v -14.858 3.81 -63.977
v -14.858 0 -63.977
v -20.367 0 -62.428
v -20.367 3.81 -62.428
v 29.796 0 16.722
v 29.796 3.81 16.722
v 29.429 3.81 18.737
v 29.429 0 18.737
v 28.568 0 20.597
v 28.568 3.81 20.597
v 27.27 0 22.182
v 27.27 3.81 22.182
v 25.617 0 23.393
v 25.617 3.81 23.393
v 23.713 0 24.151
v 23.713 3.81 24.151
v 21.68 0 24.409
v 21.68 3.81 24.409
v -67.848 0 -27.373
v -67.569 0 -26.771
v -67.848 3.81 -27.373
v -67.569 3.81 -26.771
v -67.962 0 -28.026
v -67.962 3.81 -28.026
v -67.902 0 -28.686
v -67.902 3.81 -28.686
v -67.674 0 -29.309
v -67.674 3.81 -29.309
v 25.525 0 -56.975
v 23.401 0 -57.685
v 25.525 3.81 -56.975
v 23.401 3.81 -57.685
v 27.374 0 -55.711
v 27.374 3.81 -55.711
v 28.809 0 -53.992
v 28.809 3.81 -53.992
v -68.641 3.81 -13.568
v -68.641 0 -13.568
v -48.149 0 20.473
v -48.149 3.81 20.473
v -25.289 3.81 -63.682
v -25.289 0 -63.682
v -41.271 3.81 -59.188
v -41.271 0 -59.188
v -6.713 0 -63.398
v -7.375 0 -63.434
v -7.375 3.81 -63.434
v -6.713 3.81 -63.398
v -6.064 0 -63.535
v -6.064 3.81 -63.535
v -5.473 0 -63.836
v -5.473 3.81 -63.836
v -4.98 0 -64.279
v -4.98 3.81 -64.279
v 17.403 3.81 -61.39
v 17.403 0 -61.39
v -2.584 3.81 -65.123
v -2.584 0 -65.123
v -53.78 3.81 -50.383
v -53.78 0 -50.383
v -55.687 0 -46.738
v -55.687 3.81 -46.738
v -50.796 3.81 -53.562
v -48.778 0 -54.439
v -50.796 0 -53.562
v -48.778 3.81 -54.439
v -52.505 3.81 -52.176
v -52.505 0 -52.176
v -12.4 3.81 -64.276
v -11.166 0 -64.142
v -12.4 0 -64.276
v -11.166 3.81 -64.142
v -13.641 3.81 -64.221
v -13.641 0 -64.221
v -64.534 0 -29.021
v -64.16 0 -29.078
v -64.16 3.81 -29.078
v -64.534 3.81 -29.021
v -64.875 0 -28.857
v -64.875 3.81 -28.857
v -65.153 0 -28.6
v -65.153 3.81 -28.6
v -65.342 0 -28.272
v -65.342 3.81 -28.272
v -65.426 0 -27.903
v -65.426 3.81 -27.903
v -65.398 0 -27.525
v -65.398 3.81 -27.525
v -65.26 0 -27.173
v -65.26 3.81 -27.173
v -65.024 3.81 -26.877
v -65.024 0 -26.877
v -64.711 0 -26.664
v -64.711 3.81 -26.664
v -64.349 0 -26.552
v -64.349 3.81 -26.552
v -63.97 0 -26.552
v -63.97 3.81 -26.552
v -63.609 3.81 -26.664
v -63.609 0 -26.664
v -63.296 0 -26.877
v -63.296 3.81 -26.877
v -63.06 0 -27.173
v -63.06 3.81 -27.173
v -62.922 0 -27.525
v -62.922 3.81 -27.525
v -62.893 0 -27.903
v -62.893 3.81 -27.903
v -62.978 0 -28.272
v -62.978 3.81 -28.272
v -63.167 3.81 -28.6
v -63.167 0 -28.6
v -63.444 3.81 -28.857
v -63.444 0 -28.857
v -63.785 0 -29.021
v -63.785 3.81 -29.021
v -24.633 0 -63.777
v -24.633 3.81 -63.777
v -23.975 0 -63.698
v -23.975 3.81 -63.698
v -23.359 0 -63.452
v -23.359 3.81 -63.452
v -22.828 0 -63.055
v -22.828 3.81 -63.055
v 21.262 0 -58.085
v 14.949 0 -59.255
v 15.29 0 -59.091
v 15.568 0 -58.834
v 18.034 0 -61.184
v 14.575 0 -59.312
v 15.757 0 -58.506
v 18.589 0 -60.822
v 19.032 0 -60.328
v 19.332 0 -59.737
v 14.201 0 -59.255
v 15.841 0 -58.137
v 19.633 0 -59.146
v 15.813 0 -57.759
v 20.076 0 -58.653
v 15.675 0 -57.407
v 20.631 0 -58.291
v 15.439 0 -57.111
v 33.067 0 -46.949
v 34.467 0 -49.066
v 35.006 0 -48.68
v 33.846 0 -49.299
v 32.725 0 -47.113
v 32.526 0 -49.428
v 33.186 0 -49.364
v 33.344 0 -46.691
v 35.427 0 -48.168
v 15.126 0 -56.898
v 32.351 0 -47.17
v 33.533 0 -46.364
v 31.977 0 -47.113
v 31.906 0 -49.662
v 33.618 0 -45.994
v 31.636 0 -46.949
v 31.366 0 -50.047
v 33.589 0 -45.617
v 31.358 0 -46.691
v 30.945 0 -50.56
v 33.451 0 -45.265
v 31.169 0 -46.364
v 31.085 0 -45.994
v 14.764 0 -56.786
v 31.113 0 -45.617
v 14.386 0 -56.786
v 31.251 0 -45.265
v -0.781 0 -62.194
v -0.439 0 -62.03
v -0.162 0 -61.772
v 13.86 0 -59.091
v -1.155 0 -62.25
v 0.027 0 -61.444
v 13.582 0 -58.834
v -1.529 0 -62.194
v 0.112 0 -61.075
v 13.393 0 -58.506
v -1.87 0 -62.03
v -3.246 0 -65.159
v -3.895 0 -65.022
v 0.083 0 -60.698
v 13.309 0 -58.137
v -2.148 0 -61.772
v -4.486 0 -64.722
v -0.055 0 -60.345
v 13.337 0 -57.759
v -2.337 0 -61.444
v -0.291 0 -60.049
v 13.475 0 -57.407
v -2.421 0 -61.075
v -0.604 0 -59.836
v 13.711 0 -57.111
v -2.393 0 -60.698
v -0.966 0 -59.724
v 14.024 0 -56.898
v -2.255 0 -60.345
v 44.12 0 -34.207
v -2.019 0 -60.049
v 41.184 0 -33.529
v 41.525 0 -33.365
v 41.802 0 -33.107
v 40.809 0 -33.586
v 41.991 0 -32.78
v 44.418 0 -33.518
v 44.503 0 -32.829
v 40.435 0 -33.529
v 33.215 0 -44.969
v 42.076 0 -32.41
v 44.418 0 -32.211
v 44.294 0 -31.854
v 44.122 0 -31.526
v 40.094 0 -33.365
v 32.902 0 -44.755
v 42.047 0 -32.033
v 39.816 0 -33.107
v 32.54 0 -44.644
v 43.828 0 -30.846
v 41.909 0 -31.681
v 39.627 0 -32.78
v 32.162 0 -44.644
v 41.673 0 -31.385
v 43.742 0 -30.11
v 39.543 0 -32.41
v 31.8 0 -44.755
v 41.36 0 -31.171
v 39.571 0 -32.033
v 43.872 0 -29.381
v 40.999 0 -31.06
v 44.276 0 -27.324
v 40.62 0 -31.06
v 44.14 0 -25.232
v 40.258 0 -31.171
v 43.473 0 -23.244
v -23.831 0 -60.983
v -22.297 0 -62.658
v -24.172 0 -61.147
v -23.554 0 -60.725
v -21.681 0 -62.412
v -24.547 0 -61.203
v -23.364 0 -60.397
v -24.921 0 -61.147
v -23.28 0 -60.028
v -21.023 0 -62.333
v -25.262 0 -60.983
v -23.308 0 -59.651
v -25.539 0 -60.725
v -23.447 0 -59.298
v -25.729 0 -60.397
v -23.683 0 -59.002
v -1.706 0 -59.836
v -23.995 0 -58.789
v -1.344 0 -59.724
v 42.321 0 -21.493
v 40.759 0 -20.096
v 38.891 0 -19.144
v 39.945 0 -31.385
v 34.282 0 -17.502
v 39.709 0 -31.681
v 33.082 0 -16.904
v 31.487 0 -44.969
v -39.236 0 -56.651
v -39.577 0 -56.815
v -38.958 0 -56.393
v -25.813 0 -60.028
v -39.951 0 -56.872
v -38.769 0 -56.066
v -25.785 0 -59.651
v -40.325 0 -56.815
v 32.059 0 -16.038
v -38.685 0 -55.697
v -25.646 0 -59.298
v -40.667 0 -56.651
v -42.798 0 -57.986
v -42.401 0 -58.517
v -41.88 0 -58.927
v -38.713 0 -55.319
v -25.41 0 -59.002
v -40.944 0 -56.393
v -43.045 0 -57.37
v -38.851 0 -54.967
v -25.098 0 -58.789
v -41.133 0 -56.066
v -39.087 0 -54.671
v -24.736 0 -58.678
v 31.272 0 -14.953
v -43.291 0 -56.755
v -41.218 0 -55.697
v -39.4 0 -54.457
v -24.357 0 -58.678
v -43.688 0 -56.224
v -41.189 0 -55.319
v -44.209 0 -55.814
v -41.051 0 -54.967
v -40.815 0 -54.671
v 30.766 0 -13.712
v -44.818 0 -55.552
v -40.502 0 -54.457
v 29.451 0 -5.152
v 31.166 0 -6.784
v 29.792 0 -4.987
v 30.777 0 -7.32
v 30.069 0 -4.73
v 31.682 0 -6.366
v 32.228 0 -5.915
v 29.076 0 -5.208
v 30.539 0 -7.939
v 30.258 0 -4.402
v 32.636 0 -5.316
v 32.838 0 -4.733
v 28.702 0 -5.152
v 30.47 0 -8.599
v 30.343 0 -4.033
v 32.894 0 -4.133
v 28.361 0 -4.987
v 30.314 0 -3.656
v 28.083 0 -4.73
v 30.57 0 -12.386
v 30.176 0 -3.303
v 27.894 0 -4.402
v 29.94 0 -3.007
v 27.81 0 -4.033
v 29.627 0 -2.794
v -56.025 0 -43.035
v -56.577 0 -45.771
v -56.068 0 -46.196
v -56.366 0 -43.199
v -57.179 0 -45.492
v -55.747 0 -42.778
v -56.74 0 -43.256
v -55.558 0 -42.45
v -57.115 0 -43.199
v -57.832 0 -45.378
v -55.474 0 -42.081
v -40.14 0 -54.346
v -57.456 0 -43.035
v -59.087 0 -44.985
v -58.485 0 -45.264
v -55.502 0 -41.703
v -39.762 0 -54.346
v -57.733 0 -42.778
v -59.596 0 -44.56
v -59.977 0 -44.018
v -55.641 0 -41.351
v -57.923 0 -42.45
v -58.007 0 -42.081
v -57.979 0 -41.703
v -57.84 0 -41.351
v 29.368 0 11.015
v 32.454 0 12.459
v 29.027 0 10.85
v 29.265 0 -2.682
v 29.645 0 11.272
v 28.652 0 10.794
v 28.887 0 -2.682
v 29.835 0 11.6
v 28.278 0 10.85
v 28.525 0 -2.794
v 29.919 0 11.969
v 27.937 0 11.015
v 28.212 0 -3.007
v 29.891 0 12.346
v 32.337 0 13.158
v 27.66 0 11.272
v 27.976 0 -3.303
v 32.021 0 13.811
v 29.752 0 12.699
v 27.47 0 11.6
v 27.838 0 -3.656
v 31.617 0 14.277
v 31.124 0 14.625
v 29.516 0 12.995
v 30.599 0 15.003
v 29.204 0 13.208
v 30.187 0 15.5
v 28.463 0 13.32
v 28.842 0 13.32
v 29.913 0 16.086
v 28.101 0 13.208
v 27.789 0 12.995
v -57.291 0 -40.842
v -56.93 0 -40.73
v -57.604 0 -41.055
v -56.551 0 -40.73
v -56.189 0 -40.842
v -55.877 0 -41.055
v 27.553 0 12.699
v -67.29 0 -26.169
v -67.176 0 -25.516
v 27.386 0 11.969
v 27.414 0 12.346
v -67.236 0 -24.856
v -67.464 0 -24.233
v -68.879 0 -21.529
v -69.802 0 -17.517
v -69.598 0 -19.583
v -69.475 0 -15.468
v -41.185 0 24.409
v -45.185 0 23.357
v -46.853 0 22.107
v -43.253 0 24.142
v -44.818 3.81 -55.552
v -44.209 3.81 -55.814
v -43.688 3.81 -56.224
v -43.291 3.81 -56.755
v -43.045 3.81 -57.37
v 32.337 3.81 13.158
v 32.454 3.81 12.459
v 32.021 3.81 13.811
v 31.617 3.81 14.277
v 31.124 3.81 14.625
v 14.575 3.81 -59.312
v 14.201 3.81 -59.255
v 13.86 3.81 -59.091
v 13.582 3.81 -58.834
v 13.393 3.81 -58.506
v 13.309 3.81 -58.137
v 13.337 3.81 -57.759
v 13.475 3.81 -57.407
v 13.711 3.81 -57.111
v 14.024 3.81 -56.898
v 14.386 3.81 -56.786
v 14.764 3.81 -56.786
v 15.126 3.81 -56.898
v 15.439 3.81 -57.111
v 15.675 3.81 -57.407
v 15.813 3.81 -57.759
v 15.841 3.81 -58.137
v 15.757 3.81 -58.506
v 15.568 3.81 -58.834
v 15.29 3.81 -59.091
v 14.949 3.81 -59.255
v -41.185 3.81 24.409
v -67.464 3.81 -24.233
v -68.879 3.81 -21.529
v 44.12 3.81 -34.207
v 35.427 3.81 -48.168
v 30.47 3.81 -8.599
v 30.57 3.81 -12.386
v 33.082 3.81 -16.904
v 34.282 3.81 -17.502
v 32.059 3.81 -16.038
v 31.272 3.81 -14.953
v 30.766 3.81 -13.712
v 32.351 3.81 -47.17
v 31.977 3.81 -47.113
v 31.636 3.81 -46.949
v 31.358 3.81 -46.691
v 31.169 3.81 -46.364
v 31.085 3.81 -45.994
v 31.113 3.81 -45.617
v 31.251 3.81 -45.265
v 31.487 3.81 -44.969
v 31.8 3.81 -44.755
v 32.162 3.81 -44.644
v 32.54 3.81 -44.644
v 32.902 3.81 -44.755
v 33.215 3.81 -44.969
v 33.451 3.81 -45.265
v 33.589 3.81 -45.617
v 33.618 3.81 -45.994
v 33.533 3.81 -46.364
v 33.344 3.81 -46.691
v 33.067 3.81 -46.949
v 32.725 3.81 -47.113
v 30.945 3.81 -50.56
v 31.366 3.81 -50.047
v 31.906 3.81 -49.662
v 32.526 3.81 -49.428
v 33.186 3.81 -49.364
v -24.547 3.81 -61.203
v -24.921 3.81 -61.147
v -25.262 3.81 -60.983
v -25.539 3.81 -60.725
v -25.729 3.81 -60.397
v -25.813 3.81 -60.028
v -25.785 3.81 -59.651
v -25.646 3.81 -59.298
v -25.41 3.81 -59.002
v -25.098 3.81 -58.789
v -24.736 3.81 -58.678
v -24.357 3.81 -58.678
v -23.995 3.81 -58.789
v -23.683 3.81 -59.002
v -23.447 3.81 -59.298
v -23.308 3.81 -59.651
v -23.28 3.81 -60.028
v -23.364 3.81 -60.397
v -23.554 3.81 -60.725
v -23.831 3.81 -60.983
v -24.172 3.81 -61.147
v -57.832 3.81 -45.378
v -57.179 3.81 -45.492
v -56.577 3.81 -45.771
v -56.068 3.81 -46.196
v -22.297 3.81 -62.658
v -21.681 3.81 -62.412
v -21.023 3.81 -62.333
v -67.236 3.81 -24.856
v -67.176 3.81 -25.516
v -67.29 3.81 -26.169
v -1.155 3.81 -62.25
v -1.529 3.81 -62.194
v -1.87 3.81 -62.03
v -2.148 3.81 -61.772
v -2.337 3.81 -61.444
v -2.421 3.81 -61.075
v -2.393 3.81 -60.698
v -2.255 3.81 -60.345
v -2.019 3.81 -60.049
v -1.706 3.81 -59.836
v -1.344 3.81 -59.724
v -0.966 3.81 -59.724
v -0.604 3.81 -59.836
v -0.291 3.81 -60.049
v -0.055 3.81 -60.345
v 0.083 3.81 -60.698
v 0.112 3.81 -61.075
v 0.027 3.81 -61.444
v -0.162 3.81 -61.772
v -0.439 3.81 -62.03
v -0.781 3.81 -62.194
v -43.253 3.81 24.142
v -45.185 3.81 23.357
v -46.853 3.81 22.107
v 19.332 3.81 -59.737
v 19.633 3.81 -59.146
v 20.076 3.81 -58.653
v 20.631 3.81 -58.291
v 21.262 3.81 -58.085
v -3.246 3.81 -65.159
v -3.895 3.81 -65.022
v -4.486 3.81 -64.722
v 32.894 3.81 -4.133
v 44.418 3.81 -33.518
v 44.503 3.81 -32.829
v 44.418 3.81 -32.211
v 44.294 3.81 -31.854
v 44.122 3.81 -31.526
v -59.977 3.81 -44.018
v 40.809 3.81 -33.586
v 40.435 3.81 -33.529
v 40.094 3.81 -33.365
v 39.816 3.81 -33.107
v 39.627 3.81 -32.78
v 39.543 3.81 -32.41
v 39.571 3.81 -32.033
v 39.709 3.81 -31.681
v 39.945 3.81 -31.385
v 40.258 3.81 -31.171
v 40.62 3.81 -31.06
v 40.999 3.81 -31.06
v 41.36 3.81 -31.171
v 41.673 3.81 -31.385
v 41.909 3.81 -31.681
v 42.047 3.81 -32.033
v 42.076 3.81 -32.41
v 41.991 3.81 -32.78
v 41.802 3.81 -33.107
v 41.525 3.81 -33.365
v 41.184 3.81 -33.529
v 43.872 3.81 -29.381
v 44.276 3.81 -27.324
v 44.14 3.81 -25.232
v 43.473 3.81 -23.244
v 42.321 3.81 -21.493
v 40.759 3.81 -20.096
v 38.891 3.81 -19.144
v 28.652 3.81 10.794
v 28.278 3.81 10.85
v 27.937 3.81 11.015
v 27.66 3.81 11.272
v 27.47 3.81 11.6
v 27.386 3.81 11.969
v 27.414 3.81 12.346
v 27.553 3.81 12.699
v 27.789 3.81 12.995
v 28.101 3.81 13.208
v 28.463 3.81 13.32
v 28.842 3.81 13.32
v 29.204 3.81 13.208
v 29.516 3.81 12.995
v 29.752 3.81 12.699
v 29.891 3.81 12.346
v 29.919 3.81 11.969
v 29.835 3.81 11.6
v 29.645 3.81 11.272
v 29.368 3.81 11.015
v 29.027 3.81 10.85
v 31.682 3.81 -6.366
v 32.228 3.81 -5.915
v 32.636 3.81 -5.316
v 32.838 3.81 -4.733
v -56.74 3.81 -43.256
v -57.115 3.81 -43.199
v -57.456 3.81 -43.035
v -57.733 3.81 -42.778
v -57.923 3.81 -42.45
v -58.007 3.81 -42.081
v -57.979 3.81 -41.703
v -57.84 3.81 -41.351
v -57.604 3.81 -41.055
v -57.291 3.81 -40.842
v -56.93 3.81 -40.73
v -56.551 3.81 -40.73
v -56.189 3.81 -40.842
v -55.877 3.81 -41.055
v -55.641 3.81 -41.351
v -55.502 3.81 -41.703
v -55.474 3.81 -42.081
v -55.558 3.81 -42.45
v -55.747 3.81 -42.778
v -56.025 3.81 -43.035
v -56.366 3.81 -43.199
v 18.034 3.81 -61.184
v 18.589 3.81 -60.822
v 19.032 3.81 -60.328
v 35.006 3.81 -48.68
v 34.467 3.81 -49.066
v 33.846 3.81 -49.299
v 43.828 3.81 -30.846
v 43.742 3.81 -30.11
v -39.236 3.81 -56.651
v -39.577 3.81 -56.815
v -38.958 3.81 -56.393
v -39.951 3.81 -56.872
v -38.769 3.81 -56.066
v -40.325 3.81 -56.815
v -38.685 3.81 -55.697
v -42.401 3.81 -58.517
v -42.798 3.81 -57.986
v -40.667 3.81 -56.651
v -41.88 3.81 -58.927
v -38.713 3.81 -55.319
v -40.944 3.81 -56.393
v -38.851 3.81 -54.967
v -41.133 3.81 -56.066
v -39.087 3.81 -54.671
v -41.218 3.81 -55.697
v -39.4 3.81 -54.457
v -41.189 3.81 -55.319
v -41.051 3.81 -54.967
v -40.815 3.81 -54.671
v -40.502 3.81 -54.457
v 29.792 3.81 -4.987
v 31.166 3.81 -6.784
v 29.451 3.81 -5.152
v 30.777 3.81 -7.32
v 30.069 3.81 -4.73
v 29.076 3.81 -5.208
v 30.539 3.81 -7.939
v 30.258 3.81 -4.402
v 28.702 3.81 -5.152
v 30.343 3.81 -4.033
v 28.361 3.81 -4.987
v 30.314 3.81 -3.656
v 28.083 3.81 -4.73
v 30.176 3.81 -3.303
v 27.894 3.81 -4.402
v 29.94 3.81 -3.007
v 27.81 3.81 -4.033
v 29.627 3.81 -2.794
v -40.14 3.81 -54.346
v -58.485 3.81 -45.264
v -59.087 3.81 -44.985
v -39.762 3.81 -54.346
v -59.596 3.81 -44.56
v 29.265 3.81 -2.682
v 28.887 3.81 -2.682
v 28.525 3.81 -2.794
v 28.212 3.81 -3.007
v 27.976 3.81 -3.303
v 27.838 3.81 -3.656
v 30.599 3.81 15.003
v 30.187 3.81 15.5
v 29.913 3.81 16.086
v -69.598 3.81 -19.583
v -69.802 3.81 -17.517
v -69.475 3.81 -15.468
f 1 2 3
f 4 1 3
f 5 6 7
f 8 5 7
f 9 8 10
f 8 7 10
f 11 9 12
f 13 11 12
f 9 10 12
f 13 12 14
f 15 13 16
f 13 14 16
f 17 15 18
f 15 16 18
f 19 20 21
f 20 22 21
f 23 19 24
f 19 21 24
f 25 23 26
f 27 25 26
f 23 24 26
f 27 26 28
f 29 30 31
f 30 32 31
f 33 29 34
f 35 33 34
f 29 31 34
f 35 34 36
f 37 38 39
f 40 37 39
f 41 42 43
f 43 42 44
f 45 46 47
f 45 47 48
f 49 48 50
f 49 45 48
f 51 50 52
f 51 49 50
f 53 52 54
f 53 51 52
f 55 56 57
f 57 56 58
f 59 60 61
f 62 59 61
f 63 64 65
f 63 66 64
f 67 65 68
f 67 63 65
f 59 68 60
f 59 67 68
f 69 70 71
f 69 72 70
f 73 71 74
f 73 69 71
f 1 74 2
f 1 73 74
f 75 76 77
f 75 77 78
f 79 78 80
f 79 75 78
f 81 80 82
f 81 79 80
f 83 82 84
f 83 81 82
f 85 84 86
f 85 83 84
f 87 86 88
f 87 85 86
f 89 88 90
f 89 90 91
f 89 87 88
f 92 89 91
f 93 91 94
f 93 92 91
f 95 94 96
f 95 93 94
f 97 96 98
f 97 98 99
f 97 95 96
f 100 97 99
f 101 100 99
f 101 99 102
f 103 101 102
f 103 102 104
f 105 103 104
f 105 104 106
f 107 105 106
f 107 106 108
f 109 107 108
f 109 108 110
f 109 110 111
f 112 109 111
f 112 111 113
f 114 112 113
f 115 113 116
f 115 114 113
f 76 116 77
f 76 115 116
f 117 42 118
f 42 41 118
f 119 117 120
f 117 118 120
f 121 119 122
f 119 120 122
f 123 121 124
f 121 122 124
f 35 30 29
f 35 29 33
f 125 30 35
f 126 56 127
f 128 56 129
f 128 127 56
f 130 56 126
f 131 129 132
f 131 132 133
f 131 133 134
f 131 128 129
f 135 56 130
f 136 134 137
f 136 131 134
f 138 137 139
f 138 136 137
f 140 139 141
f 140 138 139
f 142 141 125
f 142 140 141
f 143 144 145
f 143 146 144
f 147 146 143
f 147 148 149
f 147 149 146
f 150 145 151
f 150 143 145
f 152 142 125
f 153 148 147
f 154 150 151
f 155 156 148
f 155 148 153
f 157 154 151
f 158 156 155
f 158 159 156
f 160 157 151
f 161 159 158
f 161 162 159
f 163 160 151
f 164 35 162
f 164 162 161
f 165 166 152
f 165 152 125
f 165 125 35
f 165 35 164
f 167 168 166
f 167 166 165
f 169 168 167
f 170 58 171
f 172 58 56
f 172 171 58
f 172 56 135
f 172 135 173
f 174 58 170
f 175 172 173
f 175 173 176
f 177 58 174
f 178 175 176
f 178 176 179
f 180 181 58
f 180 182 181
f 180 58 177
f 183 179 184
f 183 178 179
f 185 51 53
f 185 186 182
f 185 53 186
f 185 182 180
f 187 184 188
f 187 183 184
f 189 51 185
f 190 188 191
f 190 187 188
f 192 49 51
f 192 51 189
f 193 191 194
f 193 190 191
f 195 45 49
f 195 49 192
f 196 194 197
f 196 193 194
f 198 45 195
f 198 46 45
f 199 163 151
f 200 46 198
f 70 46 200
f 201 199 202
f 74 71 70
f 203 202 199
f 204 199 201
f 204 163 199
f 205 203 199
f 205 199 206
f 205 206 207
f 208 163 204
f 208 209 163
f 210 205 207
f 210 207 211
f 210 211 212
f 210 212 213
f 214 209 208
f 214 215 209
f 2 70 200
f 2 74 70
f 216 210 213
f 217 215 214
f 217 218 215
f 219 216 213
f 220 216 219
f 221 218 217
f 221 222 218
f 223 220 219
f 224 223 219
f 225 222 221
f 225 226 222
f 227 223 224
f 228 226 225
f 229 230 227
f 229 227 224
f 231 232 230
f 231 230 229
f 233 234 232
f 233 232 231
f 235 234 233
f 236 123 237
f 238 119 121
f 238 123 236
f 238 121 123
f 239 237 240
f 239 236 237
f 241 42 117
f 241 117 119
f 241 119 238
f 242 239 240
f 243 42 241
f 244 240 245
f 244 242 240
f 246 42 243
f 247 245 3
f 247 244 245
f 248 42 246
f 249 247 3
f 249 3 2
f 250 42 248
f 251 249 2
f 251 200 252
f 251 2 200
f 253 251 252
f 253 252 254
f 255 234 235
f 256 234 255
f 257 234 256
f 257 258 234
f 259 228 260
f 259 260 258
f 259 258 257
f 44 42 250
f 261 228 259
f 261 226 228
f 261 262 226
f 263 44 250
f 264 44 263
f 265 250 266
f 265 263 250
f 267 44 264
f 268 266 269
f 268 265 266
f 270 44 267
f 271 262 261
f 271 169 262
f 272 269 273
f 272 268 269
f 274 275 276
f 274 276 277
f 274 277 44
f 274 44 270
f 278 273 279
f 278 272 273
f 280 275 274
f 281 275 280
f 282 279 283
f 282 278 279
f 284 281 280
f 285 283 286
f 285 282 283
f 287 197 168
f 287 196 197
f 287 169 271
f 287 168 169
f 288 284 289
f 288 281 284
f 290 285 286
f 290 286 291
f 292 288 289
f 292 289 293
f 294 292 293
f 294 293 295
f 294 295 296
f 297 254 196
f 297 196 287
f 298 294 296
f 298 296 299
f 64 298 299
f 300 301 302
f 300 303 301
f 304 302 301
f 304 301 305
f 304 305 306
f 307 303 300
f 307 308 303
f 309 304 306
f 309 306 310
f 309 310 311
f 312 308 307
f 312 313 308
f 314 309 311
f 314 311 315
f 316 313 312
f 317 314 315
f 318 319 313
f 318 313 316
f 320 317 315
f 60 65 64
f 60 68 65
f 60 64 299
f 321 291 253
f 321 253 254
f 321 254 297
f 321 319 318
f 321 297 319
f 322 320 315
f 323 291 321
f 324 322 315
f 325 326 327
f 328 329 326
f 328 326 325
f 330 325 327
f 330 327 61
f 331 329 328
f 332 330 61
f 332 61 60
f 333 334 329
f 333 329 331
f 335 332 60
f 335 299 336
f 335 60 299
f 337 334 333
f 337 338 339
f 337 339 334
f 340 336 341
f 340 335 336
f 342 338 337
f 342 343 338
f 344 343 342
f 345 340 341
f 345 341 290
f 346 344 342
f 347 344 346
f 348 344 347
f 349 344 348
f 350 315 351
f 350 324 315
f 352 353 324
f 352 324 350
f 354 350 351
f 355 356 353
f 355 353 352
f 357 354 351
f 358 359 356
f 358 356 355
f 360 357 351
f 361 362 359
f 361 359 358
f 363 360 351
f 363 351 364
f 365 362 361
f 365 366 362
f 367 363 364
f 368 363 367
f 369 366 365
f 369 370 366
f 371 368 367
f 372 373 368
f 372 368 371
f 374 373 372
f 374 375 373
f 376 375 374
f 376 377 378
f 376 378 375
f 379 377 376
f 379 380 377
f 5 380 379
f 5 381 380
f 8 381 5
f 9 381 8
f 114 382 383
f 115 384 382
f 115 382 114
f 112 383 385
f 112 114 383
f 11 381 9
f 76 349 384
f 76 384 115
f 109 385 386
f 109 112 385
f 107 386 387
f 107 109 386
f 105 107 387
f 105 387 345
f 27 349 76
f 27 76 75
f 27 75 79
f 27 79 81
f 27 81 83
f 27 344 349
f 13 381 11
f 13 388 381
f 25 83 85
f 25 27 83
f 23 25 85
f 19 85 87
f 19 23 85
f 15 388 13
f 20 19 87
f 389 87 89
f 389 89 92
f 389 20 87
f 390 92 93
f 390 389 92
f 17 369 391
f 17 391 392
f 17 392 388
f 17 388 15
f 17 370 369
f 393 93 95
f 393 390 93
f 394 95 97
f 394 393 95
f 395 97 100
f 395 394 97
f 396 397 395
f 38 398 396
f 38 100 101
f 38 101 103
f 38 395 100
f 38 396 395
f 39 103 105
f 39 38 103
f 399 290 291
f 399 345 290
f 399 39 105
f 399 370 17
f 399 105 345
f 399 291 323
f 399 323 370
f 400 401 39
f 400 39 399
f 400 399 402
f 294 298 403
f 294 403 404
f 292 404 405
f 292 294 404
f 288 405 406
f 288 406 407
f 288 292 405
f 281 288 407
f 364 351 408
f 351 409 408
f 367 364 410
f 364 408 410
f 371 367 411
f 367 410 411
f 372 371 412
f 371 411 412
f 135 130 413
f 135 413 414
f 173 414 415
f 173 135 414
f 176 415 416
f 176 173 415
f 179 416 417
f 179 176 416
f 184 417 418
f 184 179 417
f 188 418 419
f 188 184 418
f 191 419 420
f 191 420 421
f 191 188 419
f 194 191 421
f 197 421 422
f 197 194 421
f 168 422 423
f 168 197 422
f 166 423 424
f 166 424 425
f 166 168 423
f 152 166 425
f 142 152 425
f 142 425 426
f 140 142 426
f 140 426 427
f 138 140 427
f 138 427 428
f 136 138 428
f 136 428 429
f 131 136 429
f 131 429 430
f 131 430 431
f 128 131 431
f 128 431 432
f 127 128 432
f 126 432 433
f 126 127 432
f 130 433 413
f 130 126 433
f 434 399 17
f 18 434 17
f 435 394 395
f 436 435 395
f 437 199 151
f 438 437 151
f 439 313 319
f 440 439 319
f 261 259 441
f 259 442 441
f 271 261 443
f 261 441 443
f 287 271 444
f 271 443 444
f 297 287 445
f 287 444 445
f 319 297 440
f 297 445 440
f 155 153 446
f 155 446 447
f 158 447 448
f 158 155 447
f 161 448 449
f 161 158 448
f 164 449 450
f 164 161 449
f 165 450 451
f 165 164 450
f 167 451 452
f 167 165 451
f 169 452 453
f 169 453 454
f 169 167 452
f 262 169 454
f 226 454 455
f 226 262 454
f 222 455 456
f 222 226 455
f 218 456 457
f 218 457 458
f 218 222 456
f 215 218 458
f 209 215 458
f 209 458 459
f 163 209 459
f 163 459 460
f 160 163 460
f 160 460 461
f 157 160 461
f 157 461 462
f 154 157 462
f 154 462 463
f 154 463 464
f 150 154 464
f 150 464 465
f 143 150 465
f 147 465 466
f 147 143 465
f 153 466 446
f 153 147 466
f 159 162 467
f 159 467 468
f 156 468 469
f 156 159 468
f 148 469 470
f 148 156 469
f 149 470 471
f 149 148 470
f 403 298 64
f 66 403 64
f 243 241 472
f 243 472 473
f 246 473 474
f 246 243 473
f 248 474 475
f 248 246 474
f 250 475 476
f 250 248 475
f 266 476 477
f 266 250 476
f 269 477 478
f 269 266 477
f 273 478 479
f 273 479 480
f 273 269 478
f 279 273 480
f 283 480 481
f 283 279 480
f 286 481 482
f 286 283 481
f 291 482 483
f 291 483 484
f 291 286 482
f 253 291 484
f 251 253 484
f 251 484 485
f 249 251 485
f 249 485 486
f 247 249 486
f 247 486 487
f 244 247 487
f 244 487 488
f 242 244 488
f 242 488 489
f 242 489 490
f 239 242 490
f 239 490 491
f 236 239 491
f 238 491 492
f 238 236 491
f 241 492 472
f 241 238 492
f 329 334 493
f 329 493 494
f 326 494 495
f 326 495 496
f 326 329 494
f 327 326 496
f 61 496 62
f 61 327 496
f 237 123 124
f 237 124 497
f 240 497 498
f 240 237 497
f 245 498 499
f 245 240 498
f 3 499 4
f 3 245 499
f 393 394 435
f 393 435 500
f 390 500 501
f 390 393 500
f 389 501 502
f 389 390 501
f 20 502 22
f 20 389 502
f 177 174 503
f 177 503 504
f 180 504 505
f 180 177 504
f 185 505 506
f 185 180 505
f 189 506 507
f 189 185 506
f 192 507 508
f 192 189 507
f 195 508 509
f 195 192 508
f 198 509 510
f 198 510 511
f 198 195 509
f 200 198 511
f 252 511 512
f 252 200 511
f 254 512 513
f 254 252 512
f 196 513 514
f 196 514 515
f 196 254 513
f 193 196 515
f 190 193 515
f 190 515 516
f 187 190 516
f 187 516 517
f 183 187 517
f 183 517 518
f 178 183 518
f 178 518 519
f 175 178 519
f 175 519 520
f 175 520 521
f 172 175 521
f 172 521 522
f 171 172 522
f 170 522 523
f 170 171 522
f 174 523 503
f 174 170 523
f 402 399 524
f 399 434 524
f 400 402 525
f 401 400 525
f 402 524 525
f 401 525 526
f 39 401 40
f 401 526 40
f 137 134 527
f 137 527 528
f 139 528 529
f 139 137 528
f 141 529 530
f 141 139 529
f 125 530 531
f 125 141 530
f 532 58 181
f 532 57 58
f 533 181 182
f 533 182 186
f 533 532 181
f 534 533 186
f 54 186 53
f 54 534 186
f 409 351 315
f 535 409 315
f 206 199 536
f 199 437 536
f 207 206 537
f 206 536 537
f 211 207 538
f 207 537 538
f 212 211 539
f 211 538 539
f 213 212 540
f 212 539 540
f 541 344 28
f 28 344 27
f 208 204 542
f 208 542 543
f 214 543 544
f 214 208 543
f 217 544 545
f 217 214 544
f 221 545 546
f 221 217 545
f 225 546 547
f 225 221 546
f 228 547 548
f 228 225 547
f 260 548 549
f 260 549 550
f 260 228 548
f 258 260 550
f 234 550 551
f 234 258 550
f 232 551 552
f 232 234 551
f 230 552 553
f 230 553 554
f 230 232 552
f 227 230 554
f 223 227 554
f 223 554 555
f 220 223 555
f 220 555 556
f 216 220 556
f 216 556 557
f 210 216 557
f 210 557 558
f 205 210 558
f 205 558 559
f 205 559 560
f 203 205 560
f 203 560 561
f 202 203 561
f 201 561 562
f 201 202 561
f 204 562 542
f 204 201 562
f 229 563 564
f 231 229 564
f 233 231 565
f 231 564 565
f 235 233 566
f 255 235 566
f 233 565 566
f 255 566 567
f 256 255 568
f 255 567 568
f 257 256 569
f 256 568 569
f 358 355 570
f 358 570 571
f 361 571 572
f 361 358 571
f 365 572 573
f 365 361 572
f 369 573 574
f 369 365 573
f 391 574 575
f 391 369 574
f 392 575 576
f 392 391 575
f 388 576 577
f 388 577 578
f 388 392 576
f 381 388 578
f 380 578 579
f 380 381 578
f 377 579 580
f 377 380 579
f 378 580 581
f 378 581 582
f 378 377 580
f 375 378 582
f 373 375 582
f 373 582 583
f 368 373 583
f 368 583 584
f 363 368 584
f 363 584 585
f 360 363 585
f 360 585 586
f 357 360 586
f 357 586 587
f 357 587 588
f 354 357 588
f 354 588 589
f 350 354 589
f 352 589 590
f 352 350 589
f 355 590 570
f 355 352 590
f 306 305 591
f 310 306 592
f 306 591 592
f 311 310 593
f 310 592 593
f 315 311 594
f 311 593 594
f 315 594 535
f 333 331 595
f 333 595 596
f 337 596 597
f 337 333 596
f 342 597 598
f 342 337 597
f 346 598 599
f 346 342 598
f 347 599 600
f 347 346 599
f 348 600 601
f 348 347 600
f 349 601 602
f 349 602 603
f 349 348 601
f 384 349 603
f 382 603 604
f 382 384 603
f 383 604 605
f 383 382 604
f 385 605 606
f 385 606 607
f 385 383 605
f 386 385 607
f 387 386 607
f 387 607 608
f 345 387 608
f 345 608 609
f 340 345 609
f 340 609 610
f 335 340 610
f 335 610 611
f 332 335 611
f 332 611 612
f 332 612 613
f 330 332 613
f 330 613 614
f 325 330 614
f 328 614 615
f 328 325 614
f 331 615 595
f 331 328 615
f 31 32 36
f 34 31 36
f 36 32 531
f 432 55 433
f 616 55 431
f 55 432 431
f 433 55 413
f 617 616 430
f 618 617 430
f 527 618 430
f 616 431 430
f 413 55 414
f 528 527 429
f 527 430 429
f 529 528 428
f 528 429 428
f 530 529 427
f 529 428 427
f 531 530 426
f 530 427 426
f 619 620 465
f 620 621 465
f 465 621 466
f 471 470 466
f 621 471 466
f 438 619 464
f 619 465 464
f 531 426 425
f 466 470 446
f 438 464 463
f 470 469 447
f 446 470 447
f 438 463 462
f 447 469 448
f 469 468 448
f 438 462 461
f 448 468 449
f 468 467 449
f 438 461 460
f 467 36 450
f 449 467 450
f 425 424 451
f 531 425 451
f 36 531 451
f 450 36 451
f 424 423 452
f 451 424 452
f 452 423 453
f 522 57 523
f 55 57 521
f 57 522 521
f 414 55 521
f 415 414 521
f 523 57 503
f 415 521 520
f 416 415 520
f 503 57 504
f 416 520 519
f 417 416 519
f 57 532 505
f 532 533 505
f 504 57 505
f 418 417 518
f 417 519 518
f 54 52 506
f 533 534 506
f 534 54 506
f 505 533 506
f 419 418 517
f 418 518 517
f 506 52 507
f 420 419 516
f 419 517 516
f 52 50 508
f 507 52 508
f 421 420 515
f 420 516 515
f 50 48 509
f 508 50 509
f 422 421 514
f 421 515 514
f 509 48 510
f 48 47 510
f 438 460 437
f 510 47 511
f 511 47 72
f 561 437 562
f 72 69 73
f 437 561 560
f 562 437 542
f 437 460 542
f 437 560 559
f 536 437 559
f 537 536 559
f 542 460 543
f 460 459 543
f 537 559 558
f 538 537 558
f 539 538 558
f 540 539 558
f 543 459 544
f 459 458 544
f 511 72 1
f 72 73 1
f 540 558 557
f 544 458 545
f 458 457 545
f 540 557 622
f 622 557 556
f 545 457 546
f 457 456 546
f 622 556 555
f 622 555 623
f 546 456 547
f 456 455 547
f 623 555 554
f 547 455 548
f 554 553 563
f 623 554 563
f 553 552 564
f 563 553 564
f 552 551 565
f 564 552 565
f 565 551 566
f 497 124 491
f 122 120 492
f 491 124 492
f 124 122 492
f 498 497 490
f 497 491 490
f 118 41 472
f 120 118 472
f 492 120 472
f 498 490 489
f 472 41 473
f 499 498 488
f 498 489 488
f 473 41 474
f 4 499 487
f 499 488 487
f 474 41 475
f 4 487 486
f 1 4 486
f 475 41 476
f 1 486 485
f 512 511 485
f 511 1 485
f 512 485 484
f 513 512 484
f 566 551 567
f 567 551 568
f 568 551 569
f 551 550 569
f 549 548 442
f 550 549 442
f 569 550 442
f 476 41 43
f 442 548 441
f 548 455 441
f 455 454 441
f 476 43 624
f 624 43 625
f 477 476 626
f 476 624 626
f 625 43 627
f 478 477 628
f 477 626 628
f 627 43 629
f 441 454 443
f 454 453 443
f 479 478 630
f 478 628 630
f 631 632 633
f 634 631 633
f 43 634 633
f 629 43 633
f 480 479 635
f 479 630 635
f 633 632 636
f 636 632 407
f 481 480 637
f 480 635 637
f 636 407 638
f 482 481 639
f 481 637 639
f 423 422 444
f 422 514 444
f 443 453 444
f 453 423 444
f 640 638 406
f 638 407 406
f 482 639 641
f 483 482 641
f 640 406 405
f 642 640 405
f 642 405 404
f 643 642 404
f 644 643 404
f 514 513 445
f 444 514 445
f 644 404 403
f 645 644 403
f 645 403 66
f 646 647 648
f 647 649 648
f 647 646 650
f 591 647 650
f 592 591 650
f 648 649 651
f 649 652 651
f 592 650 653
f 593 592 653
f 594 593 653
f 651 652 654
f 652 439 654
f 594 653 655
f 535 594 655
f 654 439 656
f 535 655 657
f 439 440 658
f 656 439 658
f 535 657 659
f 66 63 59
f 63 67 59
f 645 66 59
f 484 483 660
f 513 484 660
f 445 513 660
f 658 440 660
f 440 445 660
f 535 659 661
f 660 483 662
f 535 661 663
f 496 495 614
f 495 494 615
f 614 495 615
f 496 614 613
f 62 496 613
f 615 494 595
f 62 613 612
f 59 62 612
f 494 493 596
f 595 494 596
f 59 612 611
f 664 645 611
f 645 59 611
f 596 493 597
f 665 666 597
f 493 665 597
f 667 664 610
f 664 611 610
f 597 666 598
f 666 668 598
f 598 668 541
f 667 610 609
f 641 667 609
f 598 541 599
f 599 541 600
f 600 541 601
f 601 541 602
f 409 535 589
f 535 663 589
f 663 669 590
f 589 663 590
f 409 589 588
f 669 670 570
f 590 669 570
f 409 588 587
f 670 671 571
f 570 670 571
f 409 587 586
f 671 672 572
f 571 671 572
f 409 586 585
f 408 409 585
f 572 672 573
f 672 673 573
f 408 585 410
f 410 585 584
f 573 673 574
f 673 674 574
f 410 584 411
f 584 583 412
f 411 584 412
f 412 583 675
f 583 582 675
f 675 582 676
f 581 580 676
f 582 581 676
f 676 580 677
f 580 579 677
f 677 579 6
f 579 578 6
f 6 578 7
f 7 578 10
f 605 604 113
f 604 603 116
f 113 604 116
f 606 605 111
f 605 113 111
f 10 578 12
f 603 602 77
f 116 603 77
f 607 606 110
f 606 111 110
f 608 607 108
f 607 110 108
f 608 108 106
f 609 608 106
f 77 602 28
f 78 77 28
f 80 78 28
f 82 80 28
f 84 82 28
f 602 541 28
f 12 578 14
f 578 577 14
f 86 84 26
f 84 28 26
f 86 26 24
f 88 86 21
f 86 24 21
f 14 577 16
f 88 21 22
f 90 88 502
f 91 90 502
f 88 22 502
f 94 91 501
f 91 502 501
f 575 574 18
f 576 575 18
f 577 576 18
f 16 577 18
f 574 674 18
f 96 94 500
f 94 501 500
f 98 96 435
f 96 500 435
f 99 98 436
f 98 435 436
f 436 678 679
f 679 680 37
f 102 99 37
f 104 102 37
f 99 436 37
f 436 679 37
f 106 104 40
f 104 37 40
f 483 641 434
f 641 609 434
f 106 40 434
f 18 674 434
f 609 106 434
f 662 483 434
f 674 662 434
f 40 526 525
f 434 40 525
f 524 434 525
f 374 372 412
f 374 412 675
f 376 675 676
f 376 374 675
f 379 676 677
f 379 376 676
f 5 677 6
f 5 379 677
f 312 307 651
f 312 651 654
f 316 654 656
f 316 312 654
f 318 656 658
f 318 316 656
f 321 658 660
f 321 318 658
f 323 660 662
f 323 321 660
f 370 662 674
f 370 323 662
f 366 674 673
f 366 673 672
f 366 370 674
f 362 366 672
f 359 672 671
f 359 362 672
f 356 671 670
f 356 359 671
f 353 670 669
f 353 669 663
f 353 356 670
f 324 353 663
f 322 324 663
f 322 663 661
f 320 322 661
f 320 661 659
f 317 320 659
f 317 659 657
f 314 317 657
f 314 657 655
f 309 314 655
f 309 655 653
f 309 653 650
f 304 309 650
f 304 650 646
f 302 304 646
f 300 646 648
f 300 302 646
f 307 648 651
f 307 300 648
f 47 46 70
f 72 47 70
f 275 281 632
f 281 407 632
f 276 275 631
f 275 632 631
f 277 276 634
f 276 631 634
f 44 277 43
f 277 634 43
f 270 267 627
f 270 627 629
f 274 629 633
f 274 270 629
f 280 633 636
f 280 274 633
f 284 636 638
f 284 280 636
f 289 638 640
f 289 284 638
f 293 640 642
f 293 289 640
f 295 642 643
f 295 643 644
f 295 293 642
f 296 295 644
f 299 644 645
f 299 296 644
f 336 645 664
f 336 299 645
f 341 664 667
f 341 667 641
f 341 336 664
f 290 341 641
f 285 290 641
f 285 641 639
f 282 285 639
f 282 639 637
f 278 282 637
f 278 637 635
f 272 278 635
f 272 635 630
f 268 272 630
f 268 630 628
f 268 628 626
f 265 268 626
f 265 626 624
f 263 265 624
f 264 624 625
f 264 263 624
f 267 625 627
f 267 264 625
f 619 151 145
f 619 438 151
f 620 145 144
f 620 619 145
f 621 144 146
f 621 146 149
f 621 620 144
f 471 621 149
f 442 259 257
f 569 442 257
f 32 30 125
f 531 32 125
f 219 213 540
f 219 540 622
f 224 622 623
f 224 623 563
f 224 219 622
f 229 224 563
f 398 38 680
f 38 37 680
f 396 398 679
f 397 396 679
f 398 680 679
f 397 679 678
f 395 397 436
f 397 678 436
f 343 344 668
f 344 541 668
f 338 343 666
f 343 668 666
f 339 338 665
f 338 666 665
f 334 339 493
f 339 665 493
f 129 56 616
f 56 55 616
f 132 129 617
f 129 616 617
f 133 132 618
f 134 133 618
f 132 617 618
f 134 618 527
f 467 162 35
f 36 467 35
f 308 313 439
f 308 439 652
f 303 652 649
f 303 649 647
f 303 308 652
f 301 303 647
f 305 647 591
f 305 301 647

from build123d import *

# Parameters (mm, degrees)
SKETCH1_R           = 1.27
BOSS_EXTRUDE1_DEPTH = 3.81
FILLET1_R           = 8.128
FILLET2_R           = 5.588
FILLET3_R           = 2.54
FILLET4_R           = 2.54


with BuildPart() as part:
    # Sketch1 → Boss-Extrude1 (new body)
    with BuildSketch(Plane(origin=(0, 0, 0), x_dir=(1, 0, 0), z_dir=(0, 1, 0))):
        Polygon((26.917778839, 57.028322157), (18.764761653, 58.551267753), (19.231154767, 61.048081215), (-4.411826254, 65.464479834), (-4.878219367, 62.967666372), (-13.031236553, 64.490611968), (-22.811913306, 61.740346117), (-23.499479769, 64.185515305), (-43.060833275, 58.684983602), (-42.373266812, 56.239814414), (-52.153943565, 53.489548563), (-56.864625449, 44.487600096), (-59.115112565, 45.665270567), (-68.536476333, 27.661373635), (-66.285989216, 26.483703164), (-70.9966711, 17.481754697), (-45.779512683, -24.409388032), (29.596058622, -24.409388032), (29.864982666, -14.252947718), (32.404982666, -14.320202292), (32.942830753, 5.992678337), (30.402830753, 6.059932911), (30.671754796, 16.216373225), (48.398722953, 22.529356376), (43.028486925, 31.154097821), (45.184672286, 32.496656828), (34.444200229, 49.746139719), (32.288014868, 48.403580712), align=None)
        with Locations(Location((28.652499761, -12.063891898, 0), (0, 0, 90))):
            Circle(SKETCH1_R, mode=Mode.SUBTRACT)
        with Locations(Location((29.076203579, 3.938108102, 0), (0, 0, 90))):
            Circle(SKETCH1_R, mode=Mode.SUBTRACT)
        with Locations(Location((-64.159725757, 27.807781977, 0), (0, 0, 90))):
            Circle(SKETCH1_R, mode=Mode.SUBTRACT)
        with Locations(Location((-56.740401791, 41.985850812, 0), (0, 0, 90))):
            Circle(SKETCH1_R, mode=Mode.SUBTRACT)
        with Locations(Location((-39.951089771, 55.601661313, 0), (0, 0, 90))):
            Circle(SKETCH1_R, mode=Mode.SUBTRACT)
        with Locations(Location((-24.546523885, 59.933330029, 0), (0, 0, 90))):
            Circle(SKETCH1_R, mode=Mode.SUBTRACT)
        with Locations(Location((40.809219088, 32.315575875, 0), (0, 0, 90))):
            Circle(SKETCH1_R, mode=Mode.SUBTRACT)
        with Locations(Location((-1.154887819, 60.980198638, 0), (0, 0, 90))):
            Circle(SKETCH1_R, mode=Mode.SUBTRACT)
        with Locations(Location((14.575036992, 58.041922025, 0), (0, 0, 90))):
            Circle(SKETCH1_R, mode=Mode.SUBTRACT)
        with Locations(Location((32.351097343, 45.899543651, 0), (0, 0, 90))):
            Circle(SKETCH1_R, mode=Mode.SUBTRACT)
    extrude(amount=BOSS_EXTRUDE1_DEPTH)

    # Fillet1
    fillet1_edges = [part.edges().sort_by_distance(p)[0] for p in [
        (29.596058622, 1.905, 24.409388032),
        (-45.779512683, 1.905, 24.409388032),
        (-70.9966711, 1.905, -17.481754697),
        (-52.153943565, 1.905, -53.489548563),
        (-13.031236553, 1.905, -64.490611968),
        (26.917778839, 1.905, -57.028322157),
        (48.398722953, 1.905, -22.529356376),
    ]]
    fillet(fillet1_edges, radius=FILLET1_R)

    # Fillet2
    fillet2_edges = [part.edges().sort_by_distance(p)[0] for p in [
        (30.671754796, 1.905, -16.216373225),
    ]]
    fillet(fillet2_edges, radius=FILLET2_R)

    # Fillet3
    # the kernel refuses this fillet: 2.54 mm, written as the material it adds along each edge
    with BuildSketch(Plane(origin=(43.028486925, 0, -31.154097821), x_dir=(0.42954622715766955, 0, 0.9030448708312405), z_dir=(0, 1, 0))) as fillet3_piece_1:
        with BuildLine():
            CenterArc((2.27034081, 2.521441091), FILLET3_R, 186.469886636, 76.599657859)
            Line((-0.253482478, 2.235231353), (-0.505864807, 2.206610379))
            Line((-0.505864807, 2.206610379), (-0.252382329, -0.028620974))
            Line((-0.252382329, -0.028620974), (0.028620974, -0.252382329))
            ThreePointArc((0.028620974, -0.252382329), (0.095841513, -0.244759302), (1.933204138, -0.252144109))
            Line((1.933204138, -0.252144109), (1.963852927, 0))
        make_face()
    extrude(amount=3.81)
    with BuildSketch(Plane(origin=(29.864982666, 0, 14.252947718), x_dir=(0.9996496372388306, 0, 0.02646890190911047), z_dir=(0, 1, 0))) as fillet3_piece_2:
        with BuildLine():
            CenterArc((2.535902872, -2.54), FILLET3_R, 90, 88.412002671)
            Line((-0.003121621, -2.469610926), (-0.25702407, -2.462572019))
            ThreePointArc((-0.25702407, -2.462572019), (-0.254, -2.244365891), (-0.254, 0))
            Line((-0.254, 0), (0, 0.254))
            Line((0, 0.254), (2.535902872, 0.254))
            Line((2.535902872, 0.254), (2.535902872, 0))
        make_face()
    extrude(amount=3.81)
    with BuildSketch(Plane(origin=(30.402830753, 0, -6.059932911), x_dir=(0.026468901909109464, 0, -0.9996496372388307), z_dir=(0, 1, 0)), Plane(origin=(-66.285989216, 0, -26.483703164), x_dir=(-0.4636497916963805, 0, 0.8860185498396199), z_dir=(0, 1, 0)), Plane(origin=(-56.864625449, 0, -44.487600096), x_dir=(-0.8860185498396245, 0, -0.46364979169637166), z_dir=(0, 1, 0))) as fillet3_piece_3:
        with BuildLine():
            CenterArc((FILLET3_R, -FILLET3_R), FILLET3_R, 90, 90)
            Line((0, -FILLET3_R), (0, 0))
            Line((0, 0), (FILLET3_R, 0))
        make_face()
    extrude(amount=3.81)
    with BuildSketch(Plane(origin=(-42.373266812, 0, -56.239814414), x_dir=(-0.27069545780340803, 0, -0.9626650347470834), z_dir=(0, 1, 0)), Plane(origin=(-22.811913306, 0, -61.740346117), x_dir=(0.9626650347470831, 0, -0.27069545780340953), z_dir=(0, 1, 0)), Plane(origin=(-4.878219367, 0, -62.967666372), x_dir=(0.18361933590472898, 0, -0.9829974259792882), z_dir=(0, 1, 0)), Plane(origin=(18.764761653, 0, -58.551267753), x_dir=(0.9829974259792874, 0, 0.18361933590473364), z_dir=(0, 1, 0)), Plane(origin=(32.288014868, 0, -48.403580712), x_dir=(0.848891874527916, 0, -0.5285665382527359), z_dir=(0, 1, 0))) as fillet3_piece_4:
        with BuildLine():
            CenterArc((FILLET3_R, FILLET3_R), FILLET3_R, 180, 90)
            Line((0, FILLET3_R), (0, 0))
            Line((0, 0), (FILLET3_R, 0))
        make_face()
    extrude(amount=3.81)

    # Fillet4
    fillet4_edges = [part.edges().sort_by_distance(p)[0] for p in [
        (32.404982666, 1.905, 14.320202292),
        (32.942830753, 1.905, -5.992678337),
        (45.184672286, 1.905, -32.496656828),
        (34.444200229, 1.905, -49.746139719),
        (19.231154767, 1.905, -61.048081215),
        (-4.411826254, 1.905, -65.464479834),
        (-23.499479769, 1.905, -64.185515305),
        (-43.060833275, 1.905, -58.684983602),
        (-59.115112565, 1.905, -45.665270567),
        (-68.536476333, 1.905, -27.661373635),
    ]]
    fillet(fillet4_edges, radius=FILLET4_R)


solid = part.part
